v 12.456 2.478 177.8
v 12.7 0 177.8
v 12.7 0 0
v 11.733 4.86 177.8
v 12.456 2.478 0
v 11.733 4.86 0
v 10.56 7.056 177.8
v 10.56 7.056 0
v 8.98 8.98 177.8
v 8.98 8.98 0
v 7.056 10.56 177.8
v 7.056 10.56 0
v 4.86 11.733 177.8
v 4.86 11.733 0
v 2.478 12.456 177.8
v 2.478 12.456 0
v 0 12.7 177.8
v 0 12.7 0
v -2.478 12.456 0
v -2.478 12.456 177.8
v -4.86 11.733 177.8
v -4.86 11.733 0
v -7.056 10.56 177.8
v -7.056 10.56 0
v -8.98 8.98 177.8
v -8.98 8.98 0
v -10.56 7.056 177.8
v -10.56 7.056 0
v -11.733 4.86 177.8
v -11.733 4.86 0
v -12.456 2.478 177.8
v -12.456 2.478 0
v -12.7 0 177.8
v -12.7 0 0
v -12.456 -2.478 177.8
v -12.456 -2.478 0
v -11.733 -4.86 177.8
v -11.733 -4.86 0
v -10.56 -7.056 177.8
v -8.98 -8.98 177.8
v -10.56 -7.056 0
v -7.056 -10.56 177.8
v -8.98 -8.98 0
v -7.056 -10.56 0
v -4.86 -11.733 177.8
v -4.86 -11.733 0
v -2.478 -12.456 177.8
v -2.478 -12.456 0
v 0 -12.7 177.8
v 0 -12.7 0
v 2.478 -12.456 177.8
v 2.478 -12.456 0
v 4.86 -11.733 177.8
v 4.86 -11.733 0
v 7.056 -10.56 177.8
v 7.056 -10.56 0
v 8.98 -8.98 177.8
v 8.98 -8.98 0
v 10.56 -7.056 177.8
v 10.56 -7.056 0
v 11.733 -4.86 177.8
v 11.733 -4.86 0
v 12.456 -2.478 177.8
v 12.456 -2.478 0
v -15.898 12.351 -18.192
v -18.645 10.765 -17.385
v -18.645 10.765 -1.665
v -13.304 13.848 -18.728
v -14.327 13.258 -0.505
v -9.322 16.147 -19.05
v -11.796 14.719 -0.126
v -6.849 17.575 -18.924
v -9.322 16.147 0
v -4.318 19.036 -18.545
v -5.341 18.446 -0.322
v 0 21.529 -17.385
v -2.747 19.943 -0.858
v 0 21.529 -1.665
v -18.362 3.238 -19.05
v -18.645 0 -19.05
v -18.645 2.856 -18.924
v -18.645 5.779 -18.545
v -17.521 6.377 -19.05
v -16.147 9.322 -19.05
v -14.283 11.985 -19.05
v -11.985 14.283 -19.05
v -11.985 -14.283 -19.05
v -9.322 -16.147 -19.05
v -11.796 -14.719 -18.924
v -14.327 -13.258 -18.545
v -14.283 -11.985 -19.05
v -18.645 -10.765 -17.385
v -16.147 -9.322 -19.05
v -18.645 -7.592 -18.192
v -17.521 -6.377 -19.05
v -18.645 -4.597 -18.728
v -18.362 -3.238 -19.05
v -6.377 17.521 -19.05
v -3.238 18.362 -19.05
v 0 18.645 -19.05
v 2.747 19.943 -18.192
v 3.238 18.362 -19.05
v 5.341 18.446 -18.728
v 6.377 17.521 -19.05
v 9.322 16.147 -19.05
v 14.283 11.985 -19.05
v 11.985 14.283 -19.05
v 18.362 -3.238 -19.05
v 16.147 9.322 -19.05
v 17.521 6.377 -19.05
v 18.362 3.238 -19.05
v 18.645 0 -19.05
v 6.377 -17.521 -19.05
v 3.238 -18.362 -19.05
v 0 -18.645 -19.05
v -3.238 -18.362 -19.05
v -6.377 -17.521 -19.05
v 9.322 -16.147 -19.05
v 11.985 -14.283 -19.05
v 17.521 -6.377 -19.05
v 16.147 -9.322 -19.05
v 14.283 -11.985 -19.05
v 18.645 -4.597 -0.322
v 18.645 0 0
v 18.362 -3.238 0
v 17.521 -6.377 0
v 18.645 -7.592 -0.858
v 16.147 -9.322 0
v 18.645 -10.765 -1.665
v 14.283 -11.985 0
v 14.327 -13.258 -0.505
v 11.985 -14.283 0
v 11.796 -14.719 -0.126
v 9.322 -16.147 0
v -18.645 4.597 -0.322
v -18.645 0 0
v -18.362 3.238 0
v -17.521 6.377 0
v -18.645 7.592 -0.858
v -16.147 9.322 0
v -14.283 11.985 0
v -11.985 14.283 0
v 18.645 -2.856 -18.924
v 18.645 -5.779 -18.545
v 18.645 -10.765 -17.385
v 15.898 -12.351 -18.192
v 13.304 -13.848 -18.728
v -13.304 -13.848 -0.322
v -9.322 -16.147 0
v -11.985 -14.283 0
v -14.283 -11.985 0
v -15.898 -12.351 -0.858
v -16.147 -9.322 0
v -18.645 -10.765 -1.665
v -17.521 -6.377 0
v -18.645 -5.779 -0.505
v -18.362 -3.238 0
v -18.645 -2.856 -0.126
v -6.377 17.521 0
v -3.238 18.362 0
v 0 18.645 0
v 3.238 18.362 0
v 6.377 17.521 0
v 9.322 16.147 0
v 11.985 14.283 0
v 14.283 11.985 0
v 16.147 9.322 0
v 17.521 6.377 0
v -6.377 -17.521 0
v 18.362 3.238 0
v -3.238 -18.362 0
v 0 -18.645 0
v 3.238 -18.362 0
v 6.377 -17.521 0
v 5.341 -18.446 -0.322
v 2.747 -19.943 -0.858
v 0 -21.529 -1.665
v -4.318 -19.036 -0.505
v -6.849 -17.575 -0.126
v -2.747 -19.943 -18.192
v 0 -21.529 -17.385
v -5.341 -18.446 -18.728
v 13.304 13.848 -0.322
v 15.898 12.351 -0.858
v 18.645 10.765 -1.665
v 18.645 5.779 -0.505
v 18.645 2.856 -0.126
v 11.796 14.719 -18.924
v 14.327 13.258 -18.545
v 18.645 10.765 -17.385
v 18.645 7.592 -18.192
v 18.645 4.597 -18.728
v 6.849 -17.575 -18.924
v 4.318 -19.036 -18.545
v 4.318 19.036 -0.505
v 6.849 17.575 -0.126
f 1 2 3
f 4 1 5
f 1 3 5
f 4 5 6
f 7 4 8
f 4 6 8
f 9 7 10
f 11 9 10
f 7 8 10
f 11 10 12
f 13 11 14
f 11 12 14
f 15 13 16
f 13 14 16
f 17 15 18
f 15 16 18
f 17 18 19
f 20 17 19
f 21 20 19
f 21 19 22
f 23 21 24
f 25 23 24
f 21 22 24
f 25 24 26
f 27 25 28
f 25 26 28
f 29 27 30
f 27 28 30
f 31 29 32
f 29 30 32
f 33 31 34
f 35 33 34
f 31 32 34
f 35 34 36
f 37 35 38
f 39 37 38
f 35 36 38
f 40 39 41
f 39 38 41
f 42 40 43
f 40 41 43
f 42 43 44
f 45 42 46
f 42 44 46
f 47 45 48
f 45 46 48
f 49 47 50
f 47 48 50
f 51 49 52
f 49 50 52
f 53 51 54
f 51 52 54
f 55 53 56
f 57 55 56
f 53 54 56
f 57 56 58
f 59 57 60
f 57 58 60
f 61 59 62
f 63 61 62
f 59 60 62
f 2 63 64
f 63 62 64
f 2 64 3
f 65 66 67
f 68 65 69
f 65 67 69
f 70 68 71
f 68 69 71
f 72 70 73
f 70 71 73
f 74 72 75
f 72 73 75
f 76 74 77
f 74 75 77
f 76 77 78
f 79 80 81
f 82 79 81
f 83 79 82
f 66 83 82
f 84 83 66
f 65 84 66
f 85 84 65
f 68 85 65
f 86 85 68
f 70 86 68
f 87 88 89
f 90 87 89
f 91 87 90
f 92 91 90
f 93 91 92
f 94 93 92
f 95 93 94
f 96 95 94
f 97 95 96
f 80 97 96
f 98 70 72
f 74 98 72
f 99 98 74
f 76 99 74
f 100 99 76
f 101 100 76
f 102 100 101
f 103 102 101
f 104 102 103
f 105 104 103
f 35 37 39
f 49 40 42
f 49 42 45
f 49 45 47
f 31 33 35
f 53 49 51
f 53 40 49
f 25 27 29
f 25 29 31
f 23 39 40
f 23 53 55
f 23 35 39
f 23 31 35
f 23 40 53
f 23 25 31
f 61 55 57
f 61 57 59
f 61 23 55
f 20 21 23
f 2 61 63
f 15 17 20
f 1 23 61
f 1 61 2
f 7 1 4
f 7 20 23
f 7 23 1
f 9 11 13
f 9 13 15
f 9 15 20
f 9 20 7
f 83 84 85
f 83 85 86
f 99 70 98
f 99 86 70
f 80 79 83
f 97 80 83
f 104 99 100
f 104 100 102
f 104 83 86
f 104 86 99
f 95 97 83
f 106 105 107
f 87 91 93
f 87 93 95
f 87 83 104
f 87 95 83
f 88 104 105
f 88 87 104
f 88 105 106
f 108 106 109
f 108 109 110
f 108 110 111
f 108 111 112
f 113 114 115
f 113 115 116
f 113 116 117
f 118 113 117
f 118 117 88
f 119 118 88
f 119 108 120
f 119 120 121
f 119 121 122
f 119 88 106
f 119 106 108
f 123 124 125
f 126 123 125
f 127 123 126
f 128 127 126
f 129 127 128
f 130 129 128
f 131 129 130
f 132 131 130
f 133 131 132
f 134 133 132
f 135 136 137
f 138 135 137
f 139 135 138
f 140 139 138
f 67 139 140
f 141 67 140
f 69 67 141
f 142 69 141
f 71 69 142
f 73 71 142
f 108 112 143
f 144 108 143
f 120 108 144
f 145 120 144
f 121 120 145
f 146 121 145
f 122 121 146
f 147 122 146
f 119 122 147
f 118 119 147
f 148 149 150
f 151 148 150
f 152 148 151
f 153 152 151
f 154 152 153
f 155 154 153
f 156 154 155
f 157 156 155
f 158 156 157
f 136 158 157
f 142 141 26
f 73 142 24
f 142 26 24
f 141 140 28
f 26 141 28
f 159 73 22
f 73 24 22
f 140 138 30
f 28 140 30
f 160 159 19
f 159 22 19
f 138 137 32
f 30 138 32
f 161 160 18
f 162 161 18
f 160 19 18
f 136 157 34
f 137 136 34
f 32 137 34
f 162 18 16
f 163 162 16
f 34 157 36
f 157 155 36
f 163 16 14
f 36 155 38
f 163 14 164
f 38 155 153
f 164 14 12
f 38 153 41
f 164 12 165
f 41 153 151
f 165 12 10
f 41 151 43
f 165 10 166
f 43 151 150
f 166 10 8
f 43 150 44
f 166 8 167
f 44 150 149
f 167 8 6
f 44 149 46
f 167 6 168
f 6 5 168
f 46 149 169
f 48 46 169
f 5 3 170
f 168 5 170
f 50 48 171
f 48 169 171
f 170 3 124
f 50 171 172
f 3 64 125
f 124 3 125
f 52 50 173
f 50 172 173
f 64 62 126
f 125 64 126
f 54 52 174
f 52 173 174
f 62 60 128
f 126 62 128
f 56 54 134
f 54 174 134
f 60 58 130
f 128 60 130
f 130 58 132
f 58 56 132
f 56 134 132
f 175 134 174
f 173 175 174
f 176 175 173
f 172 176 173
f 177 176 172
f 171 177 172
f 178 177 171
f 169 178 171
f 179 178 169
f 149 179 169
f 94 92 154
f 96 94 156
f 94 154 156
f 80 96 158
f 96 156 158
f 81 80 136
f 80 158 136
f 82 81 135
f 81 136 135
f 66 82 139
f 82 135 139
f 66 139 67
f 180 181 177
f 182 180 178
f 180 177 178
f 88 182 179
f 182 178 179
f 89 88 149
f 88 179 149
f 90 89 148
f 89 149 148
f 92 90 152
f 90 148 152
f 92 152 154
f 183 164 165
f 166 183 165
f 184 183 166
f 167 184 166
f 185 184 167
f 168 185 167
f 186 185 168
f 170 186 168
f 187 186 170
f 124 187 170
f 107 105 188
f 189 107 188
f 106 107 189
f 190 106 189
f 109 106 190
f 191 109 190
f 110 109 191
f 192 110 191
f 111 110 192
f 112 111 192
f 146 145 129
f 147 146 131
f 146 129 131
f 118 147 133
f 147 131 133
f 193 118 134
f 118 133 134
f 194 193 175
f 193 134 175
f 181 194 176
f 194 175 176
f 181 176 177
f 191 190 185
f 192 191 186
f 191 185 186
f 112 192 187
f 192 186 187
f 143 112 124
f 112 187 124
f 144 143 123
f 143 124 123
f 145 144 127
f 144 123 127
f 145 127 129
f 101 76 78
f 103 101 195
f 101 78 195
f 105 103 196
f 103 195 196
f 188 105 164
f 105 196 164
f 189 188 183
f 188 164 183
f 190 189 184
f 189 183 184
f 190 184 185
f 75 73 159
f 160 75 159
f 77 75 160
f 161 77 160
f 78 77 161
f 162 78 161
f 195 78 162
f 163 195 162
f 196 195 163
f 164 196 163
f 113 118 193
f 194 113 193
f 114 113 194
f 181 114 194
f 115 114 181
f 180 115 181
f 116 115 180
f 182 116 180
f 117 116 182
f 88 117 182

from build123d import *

# Parameters (mm, degrees)
F0_R     = 12.7
F1_DEPTH = 177.8
F2_R     = 12.7
F3_DEPTH = 19.05


with BuildPart() as f1:
    # F0 (on Top) → F1 (new body)
    with BuildSketch(Plane.XY):
        Circle(F0_R)
    extrude(amount=F1_DEPTH)

    # F2 (on face) → F3 (join)
    with BuildSketch(Plane(origin=(0, 0, 0), x_dir=(1, 0, 0), z_dir=(0, 0, -1))):
        Polygon((0, -21.5293582698), (18.6449711888, -10.7646791349), (18.6449711888, 10.7646791349), (0, 21.5293582698), (-18.6449711888, 10.7646791349), (-18.6449711888, -10.7646791349), align=None)
        Circle(F2_R, mode=Mode.SUBTRACT)
        Circle(F2_R)
    extrude(amount=F3_DEPTH)

    # F4 (on Front) → F5 (revolve, cut)
    with BuildSketch(Plane.XZ):
        Polygon((31.3791224592, -11.6979343361), (18.6449711888, -19.05), (31.3791224592, -19.05), align=None)
        Polygon((18.6449711888, 0), (31.3791224592, -7.3520656639), (31.3791224592, 0), align=None)
    revolve(axis=Axis((0, 0, -9.525), (0, 0, -1)), mode=Mode.SUBTRACT)


solid = f1.part
